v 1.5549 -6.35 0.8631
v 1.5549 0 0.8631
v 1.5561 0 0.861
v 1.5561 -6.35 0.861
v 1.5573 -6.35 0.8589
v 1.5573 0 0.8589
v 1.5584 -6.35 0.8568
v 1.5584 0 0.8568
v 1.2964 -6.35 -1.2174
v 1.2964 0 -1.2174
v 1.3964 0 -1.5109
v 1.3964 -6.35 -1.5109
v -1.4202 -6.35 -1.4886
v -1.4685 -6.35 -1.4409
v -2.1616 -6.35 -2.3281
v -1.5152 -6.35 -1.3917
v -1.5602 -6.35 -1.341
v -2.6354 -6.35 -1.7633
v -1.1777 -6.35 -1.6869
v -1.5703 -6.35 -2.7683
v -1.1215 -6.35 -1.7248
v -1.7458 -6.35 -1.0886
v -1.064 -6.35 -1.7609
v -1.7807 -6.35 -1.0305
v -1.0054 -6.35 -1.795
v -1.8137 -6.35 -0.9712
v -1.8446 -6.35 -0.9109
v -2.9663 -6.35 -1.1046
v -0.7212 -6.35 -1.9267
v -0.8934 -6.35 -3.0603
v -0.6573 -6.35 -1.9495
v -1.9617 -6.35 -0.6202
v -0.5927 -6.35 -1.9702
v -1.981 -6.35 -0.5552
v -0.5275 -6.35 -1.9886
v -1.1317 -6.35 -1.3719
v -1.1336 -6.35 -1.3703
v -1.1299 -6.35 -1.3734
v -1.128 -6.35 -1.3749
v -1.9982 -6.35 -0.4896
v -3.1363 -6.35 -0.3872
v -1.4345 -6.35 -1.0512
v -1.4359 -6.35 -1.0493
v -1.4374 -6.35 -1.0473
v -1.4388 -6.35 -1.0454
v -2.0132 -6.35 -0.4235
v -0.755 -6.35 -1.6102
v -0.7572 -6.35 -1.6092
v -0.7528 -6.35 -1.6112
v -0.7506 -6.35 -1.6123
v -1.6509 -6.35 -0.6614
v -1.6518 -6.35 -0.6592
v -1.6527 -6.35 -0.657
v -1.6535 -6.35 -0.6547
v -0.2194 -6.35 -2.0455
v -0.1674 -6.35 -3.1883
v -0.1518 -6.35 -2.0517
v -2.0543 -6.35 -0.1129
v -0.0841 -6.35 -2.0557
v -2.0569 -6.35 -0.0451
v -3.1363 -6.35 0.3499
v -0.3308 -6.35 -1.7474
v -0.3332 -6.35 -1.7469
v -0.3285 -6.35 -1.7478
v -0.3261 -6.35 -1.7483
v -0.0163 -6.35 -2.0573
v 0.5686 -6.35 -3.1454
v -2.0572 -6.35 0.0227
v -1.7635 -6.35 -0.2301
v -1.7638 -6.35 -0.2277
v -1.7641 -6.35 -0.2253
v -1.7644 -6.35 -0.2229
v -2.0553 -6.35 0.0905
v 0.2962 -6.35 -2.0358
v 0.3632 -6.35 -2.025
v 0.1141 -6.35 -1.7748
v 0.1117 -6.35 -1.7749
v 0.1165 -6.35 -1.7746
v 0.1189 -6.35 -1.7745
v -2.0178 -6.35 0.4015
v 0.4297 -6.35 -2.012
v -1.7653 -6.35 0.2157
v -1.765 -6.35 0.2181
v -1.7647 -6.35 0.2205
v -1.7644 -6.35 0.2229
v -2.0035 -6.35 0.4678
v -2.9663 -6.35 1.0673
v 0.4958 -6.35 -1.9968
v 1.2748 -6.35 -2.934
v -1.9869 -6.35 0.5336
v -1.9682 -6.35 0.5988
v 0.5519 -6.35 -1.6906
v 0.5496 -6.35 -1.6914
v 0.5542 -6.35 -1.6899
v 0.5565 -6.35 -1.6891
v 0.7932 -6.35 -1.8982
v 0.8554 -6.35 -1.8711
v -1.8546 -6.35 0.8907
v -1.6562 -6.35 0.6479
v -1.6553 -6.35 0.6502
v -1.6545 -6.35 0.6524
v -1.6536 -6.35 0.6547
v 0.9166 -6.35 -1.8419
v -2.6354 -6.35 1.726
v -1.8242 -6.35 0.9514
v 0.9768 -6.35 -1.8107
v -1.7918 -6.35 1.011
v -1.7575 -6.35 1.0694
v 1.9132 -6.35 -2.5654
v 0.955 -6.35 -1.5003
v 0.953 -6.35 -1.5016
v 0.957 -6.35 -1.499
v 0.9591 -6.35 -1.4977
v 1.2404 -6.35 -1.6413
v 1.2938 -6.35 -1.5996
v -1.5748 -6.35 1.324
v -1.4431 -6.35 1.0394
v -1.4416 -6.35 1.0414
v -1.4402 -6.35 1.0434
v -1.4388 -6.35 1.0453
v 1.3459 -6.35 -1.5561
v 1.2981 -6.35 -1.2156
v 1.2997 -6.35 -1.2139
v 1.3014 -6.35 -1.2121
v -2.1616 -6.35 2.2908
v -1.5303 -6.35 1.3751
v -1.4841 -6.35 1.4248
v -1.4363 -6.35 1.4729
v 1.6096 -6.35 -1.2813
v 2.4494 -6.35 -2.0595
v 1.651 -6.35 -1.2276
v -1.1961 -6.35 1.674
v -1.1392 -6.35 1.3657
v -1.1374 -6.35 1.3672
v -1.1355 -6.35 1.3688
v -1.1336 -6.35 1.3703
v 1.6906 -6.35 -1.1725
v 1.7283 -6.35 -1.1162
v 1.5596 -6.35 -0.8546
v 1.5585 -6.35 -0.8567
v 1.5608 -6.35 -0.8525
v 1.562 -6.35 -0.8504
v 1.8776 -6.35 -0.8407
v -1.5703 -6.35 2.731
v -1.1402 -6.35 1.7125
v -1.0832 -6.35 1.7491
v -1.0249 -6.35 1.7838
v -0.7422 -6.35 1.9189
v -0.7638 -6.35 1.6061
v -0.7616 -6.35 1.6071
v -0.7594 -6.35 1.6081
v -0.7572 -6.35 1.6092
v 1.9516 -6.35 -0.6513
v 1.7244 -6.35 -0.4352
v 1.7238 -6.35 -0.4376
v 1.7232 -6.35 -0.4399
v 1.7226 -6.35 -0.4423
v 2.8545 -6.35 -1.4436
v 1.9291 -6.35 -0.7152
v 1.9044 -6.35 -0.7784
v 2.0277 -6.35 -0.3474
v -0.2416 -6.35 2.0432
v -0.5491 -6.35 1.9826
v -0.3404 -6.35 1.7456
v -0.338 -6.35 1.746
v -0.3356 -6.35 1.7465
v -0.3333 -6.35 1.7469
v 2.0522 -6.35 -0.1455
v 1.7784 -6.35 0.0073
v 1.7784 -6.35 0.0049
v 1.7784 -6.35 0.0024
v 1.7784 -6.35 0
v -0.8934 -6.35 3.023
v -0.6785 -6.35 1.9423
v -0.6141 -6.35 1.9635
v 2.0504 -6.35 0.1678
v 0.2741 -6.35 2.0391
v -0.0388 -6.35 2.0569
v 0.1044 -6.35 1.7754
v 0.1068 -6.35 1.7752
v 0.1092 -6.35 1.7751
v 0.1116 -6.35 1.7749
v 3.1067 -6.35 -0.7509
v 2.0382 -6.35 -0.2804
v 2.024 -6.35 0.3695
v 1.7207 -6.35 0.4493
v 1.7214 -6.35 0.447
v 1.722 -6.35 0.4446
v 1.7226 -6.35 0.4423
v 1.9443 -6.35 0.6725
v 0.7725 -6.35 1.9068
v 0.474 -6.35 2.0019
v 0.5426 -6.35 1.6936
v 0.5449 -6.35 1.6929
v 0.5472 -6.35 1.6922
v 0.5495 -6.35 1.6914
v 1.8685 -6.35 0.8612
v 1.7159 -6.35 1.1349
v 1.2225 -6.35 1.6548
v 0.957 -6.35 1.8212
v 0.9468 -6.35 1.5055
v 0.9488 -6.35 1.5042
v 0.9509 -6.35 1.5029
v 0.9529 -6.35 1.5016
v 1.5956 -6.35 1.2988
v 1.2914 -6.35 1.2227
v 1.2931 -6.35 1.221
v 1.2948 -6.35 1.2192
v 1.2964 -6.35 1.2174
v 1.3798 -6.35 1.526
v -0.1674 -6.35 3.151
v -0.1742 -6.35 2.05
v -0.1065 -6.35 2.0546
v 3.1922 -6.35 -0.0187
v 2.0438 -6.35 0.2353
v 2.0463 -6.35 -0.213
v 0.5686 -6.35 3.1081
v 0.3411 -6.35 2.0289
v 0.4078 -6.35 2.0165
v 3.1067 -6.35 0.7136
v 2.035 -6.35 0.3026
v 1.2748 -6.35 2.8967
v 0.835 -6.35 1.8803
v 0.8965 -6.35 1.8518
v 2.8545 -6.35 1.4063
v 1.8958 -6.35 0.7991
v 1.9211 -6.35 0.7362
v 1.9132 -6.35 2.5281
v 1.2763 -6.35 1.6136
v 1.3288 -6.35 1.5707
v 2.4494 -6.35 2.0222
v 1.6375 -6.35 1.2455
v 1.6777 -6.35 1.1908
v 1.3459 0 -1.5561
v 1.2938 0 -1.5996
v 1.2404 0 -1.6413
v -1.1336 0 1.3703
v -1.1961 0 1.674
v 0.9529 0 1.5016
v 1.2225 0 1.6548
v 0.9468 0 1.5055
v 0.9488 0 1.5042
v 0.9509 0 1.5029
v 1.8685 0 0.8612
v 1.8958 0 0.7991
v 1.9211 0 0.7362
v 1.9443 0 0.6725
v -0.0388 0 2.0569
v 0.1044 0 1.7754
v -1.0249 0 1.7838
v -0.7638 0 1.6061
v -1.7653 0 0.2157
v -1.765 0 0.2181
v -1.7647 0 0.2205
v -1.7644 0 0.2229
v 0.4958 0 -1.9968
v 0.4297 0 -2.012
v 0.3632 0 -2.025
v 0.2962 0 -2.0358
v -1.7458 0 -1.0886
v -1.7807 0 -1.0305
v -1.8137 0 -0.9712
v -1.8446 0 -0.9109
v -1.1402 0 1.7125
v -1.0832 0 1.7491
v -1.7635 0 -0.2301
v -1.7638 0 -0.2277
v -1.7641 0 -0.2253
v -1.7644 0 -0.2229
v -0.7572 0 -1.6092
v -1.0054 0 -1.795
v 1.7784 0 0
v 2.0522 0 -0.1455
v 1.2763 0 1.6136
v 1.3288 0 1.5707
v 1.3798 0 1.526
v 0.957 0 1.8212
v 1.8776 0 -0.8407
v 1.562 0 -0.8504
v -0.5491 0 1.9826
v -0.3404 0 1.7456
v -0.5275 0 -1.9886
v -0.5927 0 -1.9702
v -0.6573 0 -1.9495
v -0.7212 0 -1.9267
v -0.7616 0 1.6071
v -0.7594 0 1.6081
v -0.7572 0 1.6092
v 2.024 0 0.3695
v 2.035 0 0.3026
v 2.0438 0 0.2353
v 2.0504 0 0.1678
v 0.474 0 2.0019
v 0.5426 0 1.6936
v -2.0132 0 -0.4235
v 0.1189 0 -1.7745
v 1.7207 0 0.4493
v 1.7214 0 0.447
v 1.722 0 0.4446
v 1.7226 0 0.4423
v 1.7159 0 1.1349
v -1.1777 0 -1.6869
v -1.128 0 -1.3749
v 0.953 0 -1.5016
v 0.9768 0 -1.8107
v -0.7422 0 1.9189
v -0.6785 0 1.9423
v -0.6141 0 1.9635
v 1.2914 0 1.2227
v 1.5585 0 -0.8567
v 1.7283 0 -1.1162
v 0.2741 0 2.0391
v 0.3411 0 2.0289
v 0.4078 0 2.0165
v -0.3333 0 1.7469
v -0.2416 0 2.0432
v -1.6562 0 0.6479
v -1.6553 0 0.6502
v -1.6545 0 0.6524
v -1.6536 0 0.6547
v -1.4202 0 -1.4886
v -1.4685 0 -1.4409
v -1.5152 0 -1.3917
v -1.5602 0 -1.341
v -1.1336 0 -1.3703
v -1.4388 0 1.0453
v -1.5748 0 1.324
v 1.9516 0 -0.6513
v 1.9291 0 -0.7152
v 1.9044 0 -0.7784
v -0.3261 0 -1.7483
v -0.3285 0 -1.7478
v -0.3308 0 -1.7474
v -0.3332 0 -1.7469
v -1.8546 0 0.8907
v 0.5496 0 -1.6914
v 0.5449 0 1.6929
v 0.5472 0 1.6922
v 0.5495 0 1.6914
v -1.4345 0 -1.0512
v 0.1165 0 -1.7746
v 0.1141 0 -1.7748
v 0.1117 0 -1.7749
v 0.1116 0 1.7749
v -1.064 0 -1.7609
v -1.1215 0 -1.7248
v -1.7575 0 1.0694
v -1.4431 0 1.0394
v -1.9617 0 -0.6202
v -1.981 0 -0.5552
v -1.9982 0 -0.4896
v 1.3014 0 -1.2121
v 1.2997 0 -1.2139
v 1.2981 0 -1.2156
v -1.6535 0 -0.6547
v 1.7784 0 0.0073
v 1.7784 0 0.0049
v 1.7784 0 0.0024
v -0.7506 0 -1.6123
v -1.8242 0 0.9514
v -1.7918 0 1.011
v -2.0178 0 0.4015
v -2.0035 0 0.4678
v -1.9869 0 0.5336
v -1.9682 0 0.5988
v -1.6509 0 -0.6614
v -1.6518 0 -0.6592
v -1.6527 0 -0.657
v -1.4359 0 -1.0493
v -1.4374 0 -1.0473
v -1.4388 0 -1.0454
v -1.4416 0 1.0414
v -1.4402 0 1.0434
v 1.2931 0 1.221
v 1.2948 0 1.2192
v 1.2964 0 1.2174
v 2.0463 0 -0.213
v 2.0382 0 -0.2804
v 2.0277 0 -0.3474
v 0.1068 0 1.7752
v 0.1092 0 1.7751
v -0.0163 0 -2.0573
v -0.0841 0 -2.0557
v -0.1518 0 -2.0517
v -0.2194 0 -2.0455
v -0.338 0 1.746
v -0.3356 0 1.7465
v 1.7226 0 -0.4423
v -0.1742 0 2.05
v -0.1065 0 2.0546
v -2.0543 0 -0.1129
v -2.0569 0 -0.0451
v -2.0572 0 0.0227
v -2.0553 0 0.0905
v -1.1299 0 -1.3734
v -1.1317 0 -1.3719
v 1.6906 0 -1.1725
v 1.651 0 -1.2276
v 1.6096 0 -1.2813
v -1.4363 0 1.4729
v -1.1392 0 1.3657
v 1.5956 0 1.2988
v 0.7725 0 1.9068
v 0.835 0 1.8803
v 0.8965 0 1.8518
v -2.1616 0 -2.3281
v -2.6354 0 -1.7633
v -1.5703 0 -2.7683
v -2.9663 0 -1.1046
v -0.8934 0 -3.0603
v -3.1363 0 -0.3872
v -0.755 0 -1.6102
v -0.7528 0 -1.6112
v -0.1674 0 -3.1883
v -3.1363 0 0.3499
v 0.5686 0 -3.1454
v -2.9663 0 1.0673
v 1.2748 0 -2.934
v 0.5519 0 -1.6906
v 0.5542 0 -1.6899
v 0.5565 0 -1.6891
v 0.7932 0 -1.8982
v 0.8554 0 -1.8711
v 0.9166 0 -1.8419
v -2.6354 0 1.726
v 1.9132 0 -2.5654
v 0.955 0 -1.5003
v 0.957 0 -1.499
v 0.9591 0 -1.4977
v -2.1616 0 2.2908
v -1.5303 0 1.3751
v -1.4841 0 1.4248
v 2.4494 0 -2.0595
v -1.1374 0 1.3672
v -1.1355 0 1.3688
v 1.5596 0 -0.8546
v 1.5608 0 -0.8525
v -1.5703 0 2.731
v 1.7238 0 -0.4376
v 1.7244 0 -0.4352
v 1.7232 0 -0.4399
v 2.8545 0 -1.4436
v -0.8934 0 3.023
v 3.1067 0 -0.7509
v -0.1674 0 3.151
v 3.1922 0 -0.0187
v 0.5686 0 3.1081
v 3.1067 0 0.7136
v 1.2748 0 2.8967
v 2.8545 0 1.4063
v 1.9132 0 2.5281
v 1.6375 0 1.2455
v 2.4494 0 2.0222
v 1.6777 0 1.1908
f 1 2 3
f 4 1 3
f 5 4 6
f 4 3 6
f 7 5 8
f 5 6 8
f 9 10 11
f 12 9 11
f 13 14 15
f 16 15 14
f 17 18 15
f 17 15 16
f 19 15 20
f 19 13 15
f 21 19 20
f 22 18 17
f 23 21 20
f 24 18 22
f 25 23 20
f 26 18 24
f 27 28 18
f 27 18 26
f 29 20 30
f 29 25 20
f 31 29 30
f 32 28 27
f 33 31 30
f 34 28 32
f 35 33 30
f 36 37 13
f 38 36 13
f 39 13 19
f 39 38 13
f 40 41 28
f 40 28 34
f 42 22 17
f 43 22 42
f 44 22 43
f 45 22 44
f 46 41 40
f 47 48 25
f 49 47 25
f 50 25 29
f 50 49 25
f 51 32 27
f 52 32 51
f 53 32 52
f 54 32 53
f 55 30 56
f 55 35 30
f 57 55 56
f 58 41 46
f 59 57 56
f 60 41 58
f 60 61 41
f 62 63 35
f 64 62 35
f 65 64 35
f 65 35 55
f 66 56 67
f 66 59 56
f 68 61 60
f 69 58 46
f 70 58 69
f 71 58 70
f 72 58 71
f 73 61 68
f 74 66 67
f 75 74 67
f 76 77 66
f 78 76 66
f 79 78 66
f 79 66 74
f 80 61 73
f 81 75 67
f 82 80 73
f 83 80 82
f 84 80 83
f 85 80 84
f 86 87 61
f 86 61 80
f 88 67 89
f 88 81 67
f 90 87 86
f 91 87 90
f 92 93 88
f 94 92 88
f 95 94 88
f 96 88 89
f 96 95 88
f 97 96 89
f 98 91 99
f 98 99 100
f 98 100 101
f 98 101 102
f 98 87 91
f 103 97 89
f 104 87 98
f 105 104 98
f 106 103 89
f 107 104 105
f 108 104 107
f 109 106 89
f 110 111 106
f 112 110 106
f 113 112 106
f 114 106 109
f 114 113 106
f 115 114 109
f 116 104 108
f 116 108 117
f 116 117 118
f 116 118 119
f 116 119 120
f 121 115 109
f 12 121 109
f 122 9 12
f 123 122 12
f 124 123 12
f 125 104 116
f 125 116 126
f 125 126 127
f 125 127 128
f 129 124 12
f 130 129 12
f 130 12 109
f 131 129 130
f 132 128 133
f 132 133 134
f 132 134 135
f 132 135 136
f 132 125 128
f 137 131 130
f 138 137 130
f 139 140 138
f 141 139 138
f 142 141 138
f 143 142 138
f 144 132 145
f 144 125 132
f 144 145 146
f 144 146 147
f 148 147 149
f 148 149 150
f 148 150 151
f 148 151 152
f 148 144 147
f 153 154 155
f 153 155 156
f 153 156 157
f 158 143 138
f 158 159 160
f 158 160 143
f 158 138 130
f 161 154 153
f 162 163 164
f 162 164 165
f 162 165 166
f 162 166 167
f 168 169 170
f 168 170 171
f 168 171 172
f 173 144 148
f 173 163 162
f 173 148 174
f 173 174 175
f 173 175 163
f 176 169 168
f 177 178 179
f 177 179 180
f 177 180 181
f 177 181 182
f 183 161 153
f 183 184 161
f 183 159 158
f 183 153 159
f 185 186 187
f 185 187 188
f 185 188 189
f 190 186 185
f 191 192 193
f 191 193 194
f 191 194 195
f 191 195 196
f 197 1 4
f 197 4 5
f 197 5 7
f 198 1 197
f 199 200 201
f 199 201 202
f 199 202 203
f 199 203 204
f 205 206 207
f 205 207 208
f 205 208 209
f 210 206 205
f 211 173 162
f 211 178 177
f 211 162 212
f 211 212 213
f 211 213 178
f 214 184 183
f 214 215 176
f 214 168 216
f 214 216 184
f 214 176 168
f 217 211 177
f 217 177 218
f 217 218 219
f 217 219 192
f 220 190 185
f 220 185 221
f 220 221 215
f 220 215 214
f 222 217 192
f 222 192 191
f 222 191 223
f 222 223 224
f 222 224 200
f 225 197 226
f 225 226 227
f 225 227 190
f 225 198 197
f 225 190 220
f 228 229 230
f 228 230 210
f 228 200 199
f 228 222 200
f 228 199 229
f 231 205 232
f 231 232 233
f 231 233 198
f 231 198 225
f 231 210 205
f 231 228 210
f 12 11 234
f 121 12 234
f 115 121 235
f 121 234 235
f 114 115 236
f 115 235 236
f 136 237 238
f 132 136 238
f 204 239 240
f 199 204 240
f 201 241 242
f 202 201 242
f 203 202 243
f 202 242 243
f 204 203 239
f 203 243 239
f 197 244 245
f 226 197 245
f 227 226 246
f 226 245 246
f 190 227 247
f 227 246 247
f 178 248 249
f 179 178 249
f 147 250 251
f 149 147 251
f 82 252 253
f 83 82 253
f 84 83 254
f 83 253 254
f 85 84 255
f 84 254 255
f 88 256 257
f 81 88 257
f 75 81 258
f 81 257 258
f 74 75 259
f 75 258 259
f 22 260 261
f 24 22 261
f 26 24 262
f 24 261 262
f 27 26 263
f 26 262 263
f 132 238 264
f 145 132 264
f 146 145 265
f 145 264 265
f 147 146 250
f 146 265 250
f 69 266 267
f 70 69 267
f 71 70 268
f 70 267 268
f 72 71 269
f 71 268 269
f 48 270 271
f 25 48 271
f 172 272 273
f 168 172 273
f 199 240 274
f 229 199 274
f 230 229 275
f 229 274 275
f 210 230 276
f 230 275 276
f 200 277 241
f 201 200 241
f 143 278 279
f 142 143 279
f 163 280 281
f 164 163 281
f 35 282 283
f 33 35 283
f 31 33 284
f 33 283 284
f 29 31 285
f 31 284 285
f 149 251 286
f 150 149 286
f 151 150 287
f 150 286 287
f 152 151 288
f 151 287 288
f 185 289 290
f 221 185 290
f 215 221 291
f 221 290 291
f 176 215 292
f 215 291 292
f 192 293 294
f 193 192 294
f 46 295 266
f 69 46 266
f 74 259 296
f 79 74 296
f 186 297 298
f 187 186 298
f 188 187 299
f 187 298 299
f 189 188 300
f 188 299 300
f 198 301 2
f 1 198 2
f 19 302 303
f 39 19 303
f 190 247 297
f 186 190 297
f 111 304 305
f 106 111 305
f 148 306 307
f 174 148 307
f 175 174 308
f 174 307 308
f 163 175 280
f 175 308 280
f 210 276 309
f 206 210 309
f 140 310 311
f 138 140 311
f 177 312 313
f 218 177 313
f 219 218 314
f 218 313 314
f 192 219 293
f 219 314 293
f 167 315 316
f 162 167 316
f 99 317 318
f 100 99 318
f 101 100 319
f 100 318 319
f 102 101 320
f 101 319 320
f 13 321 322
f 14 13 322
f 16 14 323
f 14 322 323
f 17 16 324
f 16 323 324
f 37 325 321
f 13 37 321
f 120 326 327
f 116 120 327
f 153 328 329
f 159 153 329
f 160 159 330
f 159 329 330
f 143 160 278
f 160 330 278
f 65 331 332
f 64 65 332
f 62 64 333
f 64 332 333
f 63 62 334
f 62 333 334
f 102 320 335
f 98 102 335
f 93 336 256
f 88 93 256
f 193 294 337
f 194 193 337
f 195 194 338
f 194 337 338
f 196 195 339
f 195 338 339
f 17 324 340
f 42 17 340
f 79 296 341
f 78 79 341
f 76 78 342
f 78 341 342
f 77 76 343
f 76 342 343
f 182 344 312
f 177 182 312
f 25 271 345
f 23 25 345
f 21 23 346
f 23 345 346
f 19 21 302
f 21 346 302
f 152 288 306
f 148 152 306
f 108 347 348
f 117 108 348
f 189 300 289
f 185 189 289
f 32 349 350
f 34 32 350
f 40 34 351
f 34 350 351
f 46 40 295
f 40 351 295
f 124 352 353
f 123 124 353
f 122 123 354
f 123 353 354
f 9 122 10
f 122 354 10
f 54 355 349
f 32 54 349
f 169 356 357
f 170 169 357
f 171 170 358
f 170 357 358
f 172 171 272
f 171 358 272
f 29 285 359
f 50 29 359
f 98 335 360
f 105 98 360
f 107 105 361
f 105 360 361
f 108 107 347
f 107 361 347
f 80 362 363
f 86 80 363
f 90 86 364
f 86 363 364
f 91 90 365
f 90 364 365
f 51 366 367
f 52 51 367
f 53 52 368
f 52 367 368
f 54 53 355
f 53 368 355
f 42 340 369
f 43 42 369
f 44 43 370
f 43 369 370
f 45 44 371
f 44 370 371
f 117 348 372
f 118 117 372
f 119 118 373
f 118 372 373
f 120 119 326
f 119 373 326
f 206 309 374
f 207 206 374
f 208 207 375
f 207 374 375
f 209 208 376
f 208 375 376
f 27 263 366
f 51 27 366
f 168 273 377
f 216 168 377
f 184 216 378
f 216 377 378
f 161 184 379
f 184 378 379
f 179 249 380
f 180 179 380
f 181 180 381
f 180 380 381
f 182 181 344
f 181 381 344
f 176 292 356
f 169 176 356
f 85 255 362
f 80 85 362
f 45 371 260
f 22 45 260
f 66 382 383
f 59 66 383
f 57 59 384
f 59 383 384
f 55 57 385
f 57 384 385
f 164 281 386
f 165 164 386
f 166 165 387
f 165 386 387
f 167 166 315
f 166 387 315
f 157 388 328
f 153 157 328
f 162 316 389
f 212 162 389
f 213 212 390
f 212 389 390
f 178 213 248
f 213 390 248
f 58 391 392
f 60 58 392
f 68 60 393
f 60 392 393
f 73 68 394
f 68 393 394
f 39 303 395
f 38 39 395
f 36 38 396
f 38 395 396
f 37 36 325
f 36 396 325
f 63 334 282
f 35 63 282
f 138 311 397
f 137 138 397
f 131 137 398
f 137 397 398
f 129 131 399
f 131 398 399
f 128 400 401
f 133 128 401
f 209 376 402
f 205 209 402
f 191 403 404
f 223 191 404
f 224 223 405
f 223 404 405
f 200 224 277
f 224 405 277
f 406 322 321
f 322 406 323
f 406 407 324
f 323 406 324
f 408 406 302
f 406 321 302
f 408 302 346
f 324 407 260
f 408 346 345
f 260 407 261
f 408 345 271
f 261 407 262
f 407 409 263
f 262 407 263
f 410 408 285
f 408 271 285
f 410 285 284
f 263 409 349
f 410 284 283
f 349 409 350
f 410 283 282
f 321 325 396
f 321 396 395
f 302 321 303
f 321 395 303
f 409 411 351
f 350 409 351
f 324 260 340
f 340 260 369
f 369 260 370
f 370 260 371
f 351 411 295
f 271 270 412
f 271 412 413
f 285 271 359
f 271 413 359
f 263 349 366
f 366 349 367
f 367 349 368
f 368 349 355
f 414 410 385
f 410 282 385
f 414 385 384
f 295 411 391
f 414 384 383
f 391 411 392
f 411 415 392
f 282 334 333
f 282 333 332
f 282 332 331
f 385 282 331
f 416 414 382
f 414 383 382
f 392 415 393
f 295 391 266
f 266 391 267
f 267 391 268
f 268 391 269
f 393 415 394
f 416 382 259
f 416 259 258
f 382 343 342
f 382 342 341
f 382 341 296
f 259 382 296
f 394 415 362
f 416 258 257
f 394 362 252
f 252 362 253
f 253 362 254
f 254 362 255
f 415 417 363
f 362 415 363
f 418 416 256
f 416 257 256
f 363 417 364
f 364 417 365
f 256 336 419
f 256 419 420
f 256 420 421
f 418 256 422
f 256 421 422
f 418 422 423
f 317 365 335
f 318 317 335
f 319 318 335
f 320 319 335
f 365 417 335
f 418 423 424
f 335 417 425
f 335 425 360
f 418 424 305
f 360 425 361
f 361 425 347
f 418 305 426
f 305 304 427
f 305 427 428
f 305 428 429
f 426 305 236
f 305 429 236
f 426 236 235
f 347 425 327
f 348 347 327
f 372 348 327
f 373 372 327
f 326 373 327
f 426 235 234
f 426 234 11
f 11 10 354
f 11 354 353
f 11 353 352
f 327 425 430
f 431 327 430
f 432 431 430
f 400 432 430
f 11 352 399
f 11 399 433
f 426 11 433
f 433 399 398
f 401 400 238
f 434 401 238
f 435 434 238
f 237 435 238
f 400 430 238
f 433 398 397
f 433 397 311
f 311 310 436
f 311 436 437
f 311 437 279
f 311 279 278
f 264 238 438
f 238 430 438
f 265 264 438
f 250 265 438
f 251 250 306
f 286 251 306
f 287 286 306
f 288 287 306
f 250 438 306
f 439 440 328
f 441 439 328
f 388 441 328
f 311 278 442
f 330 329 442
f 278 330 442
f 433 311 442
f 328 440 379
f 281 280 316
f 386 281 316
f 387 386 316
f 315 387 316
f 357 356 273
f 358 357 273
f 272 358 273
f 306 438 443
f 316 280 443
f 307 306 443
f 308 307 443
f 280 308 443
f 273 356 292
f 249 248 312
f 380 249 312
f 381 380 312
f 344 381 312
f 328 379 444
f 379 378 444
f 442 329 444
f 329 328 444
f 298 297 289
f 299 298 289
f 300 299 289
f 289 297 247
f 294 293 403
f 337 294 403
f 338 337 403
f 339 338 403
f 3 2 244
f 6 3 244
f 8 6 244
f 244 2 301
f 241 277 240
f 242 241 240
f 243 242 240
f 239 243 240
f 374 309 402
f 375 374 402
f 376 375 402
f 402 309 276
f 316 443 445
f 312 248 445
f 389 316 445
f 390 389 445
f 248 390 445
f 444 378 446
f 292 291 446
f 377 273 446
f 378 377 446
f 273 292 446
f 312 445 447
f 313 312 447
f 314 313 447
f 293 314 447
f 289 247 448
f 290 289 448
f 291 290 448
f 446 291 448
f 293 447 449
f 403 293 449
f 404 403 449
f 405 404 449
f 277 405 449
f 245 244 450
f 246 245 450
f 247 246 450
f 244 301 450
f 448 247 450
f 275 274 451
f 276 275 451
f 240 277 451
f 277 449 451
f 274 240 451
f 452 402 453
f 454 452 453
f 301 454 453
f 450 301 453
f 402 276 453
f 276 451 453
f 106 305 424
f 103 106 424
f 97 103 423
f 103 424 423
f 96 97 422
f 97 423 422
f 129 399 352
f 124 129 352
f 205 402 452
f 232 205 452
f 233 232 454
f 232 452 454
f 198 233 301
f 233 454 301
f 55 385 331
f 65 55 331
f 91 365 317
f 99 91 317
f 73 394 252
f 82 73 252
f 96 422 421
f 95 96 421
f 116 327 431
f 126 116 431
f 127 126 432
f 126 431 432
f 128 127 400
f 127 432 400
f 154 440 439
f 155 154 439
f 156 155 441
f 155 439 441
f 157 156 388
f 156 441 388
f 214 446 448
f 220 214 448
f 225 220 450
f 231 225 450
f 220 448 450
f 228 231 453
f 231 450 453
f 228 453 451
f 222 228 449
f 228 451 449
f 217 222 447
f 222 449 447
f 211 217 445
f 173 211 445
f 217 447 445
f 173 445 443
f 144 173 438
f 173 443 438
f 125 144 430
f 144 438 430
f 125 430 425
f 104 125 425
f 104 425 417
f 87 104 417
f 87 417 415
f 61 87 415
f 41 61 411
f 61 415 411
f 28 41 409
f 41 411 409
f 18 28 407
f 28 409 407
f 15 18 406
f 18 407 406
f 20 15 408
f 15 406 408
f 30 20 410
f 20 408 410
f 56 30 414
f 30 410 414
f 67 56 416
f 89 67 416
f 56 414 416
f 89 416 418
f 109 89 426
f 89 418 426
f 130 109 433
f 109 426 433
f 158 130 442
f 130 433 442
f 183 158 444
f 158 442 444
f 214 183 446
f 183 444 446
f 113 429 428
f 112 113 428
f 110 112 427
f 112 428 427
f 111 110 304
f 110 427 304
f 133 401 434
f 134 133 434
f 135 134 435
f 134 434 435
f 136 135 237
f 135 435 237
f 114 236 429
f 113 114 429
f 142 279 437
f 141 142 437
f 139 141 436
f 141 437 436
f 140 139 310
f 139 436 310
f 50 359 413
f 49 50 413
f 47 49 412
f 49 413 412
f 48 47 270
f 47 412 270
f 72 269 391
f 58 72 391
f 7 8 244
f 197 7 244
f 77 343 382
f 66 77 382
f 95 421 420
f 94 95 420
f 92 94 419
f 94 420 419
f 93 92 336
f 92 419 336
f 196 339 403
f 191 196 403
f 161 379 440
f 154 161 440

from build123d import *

# Parameters (mm, degrees)
F0_R     = 3.175
F1_DEPTH = 6.35


with BuildPart() as f1:
    # F0 (on Front) → F1 (new body)
    with BuildSketch(Plane.XZ):
        with Locations((0.01724, -0.018653)):
            Circle(F0_R)
        with BuildLine():
            ThreePointArc((1.778428, 0.007274), (1.778439, 0.00365), (1.778443, 2.5e-05))
            Line((1.778443, 2.5e-05), (2.05225, -0.145481))
            ThreePointArc((2.05225, -0.145481), (2.042521, -0.246727), (2.027738, -0.347359))
            Line((2.027738, -0.347359), (1.724364, -0.435232))
            ThreePointArc((1.724364, -0.435232), (1.723473, -0.438745), (1.722576, -0.442256))
            Line((1.722576, -0.442256), (1.951595, -0.651284))
            ThreePointArc((1.951595, -0.651284), (1.916993, -0.74693), (1.877648, -0.840723))
            Line((1.877648, -0.840723), (1.561952, -0.85039))
            ThreePointArc((1.561952, -0.85039), (1.560216, -0.853571), (1.558473, -0.856749))
            Line((1.558473, -0.856749), (1.728314, -1.116165))
            ThreePointArc((1.728314, -1.116165), (1.671013, -1.2002), (1.609579, -1.281263))
            Line((1.609579, -1.281263), (1.301397, -1.212115))
            ThreePointArc((1.301397, -1.212115), (1.298924, -1.214765), (1.296446, -1.217409))
            Line((1.296446, -1.217409), (1.396437, -1.510913))
            ThreePointArc((1.396437, -1.510913), (1.320038, -1.578058), (1.240374, -1.641295))
            Line((1.240374, -1.641295), (0.959071, -1.497679))
            ThreePointArc((0.959071, -1.497679), (0.956017, -1.49963), (0.952959, -1.501575))
            Line((0.952959, -1.501575), (0.976817, -1.810725))
            ThreePointArc((0.976817, -1.810725), (0.886119, -1.85676), (0.793232, -1.8982))
            Line((0.793232, -1.8982), (0.556482, -1.689137))
            ThreePointArc((0.556482, -1.689137), (0.553039, -1.690268), (0.549593, -1.691391))
            Line((0.549593, -1.691391), (0.495819, -1.996762))
            ThreePointArc((0.495819, -1.996762), (0.396523, -2.018795), (0.296248, -2.035833))
            Line((0.296248, -2.035833), (0.118928, -1.774462))
            ThreePointArc((0.118928, -1.774462), (0.115311, -1.7747), (0.111695, -1.774932))
            Line((0.111695, -1.774932), (-0.016332, -2.057335))
            ThreePointArc((-0.016332, -2.057335), (-0.117989, -2.053982), (-0.21935, -2.045547))
            Line((-0.21935, -2.045547), (-0.326099, -1.74829))
            ThreePointArc((-0.326099, -1.74829), (-0.329661, -1.747622), (-0.333222, -1.746946))
            Line((-0.333222, -1.746946), (-0.527457, -1.988639))
            ThreePointArc((-0.527457, -1.988639), (-0.625087, -1.96011), (-0.721166, -1.926732))
            Line((-0.721166, -1.926732), (-0.750636, -1.612266))
            ThreePointArc((-0.750636, -1.612266), (-0.75392, -1.610733), (-0.757201, -1.609194))
            Line((-0.757201, -1.609194), (-1.005441, -1.794989))
            ThreePointArc((-1.005441, -1.794989), (-1.092908, -1.743077), (-1.177668, -1.686854))
            Line((-1.177668, -1.686854), (-1.128008, -1.374938))
            ThreePointArc((-1.128008, -1.374938), (-1.130808, -1.372637), (-1.133602, -1.37033))
            Line((-1.133602, -1.37033), (-1.420248, -1.488553))
            ThreePointArc((-1.420248, -1.488553), (-1.492058, -1.41652), (-1.560173, -1.340984))
            Line((-1.560173, -1.340984), (-1.434503, -1.051218))
            ThreePointArc((-1.434503, -1.051218), (-1.436642, -1.048293), (-1.438775, -1.045363))
            Line((-1.438775, -1.045363), (-1.745817, -1.088586))
            ThreePointArc((-1.745817, -1.088586), (-1.797456, -1.000958), (-1.844646, -0.910855))
            Line((-1.844646, -0.910855), (-1.650863, -0.661446))
            ThreePointArc((-1.650863, -0.661446), (-1.652207, -0.65808), (-1.653545, -0.654712))
            Line((-1.653545, -0.654712), (-1.961689, -0.620219))
            ThreePointArc((-1.961689, -0.620219), (-1.989914, -0.522501), (-2.013214, -0.423494))
            Line((-2.013214, -0.423494), (-1.763493, -0.230112))
            ThreePointArc((-1.763493, -0.230112), (-1.763958, -0.226518), (-1.764416, -0.222923))
            Line((-1.764416, -0.222923), (-2.054301, -0.112881))
            ThreePointArc((-2.054301, -0.112881), (-2.057338, -0.011215), (-2.055284, 0.090477))
            Line((-2.055284, 0.090477), (-1.765316, 0.21568))
            ThreePointArc((-1.765316, 0.21568), (-1.764873, 0.219277), (-1.764422, 0.222873))
            Line((-1.764422, 0.222873), (-2.017834, 0.401549))
            ThreePointArc((-2.017834, 0.401549), (-1.995492, 0.500777), (-1.968213, 0.598762))
            Line((-1.968213, 0.598762), (-1.656218, 0.64792))
            ThreePointArc((-1.656218, 0.64792), (-1.654894, 0.651294), (-1.653563, 0.654665))
            Line((-1.653563, 0.654665), (-1.854579, 0.890748))
            ThreePointArc((-1.854579, 0.890748), (-1.808262, 0.981303), (-1.757472, 1.069426))
            Line((-1.757472, 1.069426), (-1.443054, 1.039449))
            ThreePointArc((-1.443054, 1.039449), (-1.440932, 1.042388), (-1.438805, 1.045322))
            Line((-1.438805, 1.045322), (-1.574794, 1.323979))
            ThreePointArc((-1.574794, 1.323979), (-1.507412, 1.40017), (-1.436302, 1.472893))
            Line((-1.436302, 1.472893), (-1.139217, 1.365666))
            ThreePointArc((-1.139217, 1.365666), (-1.136432, 1.367984), (-1.133641, 1.370297))
            Line((-1.133641, 1.370297), (-1.196058, 1.674019))
            ThreePointArc((-1.196058, 1.674019), (-1.111846, 1.731059), (-1.024884, 1.783813))
            Line((-1.024884, 1.783813), (-0.763799, 1.606072))
            ThreePointArc((-0.763799, 1.606072), (-0.760525, 1.607626), (-0.757247, 1.609172))
            Line((-0.757247, 1.609172), (-0.74217, 1.918874))
            ThreePointArc((-0.74217, 1.918874), (-0.646418, 1.953179), (-0.549069, 1.98265))
            Line((-0.549069, 1.98265), (-0.340389, 1.745564))
            ThreePointArc((-0.340389, 1.745564), (-0.336831, 1.746254), (-0.333272, 1.746937))
            Line((-0.333272, 1.746937), (-0.241649, 2.043159))
            ThreePointArc((-0.241649, 2.043159), (-0.140374, 2.052574), (-0.038754, 2.056909))
            Line((-0.038754, 2.056909), (0.104409, 1.775375))
            ThreePointArc((0.104409, 1.775375), (0.108027, 1.775159), (0.111644, 1.774935))
            Line((0.111644, 1.774935), (0.274056, 2.039066))
            ThreePointArc((0.274056, 2.039066), (0.374491, 2.022998), (0.473996, 2.001926))
            Line((0.473996, 2.001926), (0.542647, 1.693633))
            ThreePointArc((0.542647, 1.693633), (0.546097, 1.692524), (0.549545, 1.691407))
            Line((0.549545, 1.691407), (0.772541, 1.90685))
            ThreePointArc((0.772541, 1.90685), (0.865825, 1.86631), (0.956963, 1.821153))
            Line((0.956963, 1.821153), (0.946788, 1.505474))
            ThreePointArc((0.946788, 1.505474), (0.949854, 1.503541), (0.952916, 1.501602))
            Line((0.952916, 1.501602), (1.222484, 1.654819))
            ThreePointArc((1.222484, 1.654819), (1.302756, 1.592355), (1.379801, 1.525952))
            Line((1.379801, 1.525952), (1.291439, 1.22272))
            ThreePointArc((1.291439, 1.22272), (1.293928, 1.220086), (1.296411, 1.217446))
            Line((1.296411, 1.217446), (1.595614, 1.298811))
            ThreePointArc((1.595614, 1.298811), (1.65783, 1.218346), (1.71594, 1.134868))
            Line((1.71594, 1.134868), (1.554944, 0.863138))
            ThreePointArc((1.554944, 0.863138), (1.5567, 0.859968), (1.558449, 0.856793))
            Line((1.558449, 0.856793), (1.868486, 0.861193))
            ThreePointArc((1.868486, 0.861193), (1.908736, 0.767784), (1.944261, 0.672477))
            Line((1.944261, 0.672477), (1.720746, 0.449322))
            ThreePointArc((1.720746, 0.449322), (1.721658, 0.445815), (1.722563, 0.442305))
            Line((1.722563, 0.442305), (2.023954, 0.369463))
            ThreePointArc((2.023954, 0.369463), (2.03971, 0.268979), (2.050417, 0.167832))
            Line((2.050417, 0.167832), (1.778428, 0.007274))
        make_face(mode=Mode.SUBTRACT)
    extrude(amount=F1_DEPTH)


solid = f1.part
